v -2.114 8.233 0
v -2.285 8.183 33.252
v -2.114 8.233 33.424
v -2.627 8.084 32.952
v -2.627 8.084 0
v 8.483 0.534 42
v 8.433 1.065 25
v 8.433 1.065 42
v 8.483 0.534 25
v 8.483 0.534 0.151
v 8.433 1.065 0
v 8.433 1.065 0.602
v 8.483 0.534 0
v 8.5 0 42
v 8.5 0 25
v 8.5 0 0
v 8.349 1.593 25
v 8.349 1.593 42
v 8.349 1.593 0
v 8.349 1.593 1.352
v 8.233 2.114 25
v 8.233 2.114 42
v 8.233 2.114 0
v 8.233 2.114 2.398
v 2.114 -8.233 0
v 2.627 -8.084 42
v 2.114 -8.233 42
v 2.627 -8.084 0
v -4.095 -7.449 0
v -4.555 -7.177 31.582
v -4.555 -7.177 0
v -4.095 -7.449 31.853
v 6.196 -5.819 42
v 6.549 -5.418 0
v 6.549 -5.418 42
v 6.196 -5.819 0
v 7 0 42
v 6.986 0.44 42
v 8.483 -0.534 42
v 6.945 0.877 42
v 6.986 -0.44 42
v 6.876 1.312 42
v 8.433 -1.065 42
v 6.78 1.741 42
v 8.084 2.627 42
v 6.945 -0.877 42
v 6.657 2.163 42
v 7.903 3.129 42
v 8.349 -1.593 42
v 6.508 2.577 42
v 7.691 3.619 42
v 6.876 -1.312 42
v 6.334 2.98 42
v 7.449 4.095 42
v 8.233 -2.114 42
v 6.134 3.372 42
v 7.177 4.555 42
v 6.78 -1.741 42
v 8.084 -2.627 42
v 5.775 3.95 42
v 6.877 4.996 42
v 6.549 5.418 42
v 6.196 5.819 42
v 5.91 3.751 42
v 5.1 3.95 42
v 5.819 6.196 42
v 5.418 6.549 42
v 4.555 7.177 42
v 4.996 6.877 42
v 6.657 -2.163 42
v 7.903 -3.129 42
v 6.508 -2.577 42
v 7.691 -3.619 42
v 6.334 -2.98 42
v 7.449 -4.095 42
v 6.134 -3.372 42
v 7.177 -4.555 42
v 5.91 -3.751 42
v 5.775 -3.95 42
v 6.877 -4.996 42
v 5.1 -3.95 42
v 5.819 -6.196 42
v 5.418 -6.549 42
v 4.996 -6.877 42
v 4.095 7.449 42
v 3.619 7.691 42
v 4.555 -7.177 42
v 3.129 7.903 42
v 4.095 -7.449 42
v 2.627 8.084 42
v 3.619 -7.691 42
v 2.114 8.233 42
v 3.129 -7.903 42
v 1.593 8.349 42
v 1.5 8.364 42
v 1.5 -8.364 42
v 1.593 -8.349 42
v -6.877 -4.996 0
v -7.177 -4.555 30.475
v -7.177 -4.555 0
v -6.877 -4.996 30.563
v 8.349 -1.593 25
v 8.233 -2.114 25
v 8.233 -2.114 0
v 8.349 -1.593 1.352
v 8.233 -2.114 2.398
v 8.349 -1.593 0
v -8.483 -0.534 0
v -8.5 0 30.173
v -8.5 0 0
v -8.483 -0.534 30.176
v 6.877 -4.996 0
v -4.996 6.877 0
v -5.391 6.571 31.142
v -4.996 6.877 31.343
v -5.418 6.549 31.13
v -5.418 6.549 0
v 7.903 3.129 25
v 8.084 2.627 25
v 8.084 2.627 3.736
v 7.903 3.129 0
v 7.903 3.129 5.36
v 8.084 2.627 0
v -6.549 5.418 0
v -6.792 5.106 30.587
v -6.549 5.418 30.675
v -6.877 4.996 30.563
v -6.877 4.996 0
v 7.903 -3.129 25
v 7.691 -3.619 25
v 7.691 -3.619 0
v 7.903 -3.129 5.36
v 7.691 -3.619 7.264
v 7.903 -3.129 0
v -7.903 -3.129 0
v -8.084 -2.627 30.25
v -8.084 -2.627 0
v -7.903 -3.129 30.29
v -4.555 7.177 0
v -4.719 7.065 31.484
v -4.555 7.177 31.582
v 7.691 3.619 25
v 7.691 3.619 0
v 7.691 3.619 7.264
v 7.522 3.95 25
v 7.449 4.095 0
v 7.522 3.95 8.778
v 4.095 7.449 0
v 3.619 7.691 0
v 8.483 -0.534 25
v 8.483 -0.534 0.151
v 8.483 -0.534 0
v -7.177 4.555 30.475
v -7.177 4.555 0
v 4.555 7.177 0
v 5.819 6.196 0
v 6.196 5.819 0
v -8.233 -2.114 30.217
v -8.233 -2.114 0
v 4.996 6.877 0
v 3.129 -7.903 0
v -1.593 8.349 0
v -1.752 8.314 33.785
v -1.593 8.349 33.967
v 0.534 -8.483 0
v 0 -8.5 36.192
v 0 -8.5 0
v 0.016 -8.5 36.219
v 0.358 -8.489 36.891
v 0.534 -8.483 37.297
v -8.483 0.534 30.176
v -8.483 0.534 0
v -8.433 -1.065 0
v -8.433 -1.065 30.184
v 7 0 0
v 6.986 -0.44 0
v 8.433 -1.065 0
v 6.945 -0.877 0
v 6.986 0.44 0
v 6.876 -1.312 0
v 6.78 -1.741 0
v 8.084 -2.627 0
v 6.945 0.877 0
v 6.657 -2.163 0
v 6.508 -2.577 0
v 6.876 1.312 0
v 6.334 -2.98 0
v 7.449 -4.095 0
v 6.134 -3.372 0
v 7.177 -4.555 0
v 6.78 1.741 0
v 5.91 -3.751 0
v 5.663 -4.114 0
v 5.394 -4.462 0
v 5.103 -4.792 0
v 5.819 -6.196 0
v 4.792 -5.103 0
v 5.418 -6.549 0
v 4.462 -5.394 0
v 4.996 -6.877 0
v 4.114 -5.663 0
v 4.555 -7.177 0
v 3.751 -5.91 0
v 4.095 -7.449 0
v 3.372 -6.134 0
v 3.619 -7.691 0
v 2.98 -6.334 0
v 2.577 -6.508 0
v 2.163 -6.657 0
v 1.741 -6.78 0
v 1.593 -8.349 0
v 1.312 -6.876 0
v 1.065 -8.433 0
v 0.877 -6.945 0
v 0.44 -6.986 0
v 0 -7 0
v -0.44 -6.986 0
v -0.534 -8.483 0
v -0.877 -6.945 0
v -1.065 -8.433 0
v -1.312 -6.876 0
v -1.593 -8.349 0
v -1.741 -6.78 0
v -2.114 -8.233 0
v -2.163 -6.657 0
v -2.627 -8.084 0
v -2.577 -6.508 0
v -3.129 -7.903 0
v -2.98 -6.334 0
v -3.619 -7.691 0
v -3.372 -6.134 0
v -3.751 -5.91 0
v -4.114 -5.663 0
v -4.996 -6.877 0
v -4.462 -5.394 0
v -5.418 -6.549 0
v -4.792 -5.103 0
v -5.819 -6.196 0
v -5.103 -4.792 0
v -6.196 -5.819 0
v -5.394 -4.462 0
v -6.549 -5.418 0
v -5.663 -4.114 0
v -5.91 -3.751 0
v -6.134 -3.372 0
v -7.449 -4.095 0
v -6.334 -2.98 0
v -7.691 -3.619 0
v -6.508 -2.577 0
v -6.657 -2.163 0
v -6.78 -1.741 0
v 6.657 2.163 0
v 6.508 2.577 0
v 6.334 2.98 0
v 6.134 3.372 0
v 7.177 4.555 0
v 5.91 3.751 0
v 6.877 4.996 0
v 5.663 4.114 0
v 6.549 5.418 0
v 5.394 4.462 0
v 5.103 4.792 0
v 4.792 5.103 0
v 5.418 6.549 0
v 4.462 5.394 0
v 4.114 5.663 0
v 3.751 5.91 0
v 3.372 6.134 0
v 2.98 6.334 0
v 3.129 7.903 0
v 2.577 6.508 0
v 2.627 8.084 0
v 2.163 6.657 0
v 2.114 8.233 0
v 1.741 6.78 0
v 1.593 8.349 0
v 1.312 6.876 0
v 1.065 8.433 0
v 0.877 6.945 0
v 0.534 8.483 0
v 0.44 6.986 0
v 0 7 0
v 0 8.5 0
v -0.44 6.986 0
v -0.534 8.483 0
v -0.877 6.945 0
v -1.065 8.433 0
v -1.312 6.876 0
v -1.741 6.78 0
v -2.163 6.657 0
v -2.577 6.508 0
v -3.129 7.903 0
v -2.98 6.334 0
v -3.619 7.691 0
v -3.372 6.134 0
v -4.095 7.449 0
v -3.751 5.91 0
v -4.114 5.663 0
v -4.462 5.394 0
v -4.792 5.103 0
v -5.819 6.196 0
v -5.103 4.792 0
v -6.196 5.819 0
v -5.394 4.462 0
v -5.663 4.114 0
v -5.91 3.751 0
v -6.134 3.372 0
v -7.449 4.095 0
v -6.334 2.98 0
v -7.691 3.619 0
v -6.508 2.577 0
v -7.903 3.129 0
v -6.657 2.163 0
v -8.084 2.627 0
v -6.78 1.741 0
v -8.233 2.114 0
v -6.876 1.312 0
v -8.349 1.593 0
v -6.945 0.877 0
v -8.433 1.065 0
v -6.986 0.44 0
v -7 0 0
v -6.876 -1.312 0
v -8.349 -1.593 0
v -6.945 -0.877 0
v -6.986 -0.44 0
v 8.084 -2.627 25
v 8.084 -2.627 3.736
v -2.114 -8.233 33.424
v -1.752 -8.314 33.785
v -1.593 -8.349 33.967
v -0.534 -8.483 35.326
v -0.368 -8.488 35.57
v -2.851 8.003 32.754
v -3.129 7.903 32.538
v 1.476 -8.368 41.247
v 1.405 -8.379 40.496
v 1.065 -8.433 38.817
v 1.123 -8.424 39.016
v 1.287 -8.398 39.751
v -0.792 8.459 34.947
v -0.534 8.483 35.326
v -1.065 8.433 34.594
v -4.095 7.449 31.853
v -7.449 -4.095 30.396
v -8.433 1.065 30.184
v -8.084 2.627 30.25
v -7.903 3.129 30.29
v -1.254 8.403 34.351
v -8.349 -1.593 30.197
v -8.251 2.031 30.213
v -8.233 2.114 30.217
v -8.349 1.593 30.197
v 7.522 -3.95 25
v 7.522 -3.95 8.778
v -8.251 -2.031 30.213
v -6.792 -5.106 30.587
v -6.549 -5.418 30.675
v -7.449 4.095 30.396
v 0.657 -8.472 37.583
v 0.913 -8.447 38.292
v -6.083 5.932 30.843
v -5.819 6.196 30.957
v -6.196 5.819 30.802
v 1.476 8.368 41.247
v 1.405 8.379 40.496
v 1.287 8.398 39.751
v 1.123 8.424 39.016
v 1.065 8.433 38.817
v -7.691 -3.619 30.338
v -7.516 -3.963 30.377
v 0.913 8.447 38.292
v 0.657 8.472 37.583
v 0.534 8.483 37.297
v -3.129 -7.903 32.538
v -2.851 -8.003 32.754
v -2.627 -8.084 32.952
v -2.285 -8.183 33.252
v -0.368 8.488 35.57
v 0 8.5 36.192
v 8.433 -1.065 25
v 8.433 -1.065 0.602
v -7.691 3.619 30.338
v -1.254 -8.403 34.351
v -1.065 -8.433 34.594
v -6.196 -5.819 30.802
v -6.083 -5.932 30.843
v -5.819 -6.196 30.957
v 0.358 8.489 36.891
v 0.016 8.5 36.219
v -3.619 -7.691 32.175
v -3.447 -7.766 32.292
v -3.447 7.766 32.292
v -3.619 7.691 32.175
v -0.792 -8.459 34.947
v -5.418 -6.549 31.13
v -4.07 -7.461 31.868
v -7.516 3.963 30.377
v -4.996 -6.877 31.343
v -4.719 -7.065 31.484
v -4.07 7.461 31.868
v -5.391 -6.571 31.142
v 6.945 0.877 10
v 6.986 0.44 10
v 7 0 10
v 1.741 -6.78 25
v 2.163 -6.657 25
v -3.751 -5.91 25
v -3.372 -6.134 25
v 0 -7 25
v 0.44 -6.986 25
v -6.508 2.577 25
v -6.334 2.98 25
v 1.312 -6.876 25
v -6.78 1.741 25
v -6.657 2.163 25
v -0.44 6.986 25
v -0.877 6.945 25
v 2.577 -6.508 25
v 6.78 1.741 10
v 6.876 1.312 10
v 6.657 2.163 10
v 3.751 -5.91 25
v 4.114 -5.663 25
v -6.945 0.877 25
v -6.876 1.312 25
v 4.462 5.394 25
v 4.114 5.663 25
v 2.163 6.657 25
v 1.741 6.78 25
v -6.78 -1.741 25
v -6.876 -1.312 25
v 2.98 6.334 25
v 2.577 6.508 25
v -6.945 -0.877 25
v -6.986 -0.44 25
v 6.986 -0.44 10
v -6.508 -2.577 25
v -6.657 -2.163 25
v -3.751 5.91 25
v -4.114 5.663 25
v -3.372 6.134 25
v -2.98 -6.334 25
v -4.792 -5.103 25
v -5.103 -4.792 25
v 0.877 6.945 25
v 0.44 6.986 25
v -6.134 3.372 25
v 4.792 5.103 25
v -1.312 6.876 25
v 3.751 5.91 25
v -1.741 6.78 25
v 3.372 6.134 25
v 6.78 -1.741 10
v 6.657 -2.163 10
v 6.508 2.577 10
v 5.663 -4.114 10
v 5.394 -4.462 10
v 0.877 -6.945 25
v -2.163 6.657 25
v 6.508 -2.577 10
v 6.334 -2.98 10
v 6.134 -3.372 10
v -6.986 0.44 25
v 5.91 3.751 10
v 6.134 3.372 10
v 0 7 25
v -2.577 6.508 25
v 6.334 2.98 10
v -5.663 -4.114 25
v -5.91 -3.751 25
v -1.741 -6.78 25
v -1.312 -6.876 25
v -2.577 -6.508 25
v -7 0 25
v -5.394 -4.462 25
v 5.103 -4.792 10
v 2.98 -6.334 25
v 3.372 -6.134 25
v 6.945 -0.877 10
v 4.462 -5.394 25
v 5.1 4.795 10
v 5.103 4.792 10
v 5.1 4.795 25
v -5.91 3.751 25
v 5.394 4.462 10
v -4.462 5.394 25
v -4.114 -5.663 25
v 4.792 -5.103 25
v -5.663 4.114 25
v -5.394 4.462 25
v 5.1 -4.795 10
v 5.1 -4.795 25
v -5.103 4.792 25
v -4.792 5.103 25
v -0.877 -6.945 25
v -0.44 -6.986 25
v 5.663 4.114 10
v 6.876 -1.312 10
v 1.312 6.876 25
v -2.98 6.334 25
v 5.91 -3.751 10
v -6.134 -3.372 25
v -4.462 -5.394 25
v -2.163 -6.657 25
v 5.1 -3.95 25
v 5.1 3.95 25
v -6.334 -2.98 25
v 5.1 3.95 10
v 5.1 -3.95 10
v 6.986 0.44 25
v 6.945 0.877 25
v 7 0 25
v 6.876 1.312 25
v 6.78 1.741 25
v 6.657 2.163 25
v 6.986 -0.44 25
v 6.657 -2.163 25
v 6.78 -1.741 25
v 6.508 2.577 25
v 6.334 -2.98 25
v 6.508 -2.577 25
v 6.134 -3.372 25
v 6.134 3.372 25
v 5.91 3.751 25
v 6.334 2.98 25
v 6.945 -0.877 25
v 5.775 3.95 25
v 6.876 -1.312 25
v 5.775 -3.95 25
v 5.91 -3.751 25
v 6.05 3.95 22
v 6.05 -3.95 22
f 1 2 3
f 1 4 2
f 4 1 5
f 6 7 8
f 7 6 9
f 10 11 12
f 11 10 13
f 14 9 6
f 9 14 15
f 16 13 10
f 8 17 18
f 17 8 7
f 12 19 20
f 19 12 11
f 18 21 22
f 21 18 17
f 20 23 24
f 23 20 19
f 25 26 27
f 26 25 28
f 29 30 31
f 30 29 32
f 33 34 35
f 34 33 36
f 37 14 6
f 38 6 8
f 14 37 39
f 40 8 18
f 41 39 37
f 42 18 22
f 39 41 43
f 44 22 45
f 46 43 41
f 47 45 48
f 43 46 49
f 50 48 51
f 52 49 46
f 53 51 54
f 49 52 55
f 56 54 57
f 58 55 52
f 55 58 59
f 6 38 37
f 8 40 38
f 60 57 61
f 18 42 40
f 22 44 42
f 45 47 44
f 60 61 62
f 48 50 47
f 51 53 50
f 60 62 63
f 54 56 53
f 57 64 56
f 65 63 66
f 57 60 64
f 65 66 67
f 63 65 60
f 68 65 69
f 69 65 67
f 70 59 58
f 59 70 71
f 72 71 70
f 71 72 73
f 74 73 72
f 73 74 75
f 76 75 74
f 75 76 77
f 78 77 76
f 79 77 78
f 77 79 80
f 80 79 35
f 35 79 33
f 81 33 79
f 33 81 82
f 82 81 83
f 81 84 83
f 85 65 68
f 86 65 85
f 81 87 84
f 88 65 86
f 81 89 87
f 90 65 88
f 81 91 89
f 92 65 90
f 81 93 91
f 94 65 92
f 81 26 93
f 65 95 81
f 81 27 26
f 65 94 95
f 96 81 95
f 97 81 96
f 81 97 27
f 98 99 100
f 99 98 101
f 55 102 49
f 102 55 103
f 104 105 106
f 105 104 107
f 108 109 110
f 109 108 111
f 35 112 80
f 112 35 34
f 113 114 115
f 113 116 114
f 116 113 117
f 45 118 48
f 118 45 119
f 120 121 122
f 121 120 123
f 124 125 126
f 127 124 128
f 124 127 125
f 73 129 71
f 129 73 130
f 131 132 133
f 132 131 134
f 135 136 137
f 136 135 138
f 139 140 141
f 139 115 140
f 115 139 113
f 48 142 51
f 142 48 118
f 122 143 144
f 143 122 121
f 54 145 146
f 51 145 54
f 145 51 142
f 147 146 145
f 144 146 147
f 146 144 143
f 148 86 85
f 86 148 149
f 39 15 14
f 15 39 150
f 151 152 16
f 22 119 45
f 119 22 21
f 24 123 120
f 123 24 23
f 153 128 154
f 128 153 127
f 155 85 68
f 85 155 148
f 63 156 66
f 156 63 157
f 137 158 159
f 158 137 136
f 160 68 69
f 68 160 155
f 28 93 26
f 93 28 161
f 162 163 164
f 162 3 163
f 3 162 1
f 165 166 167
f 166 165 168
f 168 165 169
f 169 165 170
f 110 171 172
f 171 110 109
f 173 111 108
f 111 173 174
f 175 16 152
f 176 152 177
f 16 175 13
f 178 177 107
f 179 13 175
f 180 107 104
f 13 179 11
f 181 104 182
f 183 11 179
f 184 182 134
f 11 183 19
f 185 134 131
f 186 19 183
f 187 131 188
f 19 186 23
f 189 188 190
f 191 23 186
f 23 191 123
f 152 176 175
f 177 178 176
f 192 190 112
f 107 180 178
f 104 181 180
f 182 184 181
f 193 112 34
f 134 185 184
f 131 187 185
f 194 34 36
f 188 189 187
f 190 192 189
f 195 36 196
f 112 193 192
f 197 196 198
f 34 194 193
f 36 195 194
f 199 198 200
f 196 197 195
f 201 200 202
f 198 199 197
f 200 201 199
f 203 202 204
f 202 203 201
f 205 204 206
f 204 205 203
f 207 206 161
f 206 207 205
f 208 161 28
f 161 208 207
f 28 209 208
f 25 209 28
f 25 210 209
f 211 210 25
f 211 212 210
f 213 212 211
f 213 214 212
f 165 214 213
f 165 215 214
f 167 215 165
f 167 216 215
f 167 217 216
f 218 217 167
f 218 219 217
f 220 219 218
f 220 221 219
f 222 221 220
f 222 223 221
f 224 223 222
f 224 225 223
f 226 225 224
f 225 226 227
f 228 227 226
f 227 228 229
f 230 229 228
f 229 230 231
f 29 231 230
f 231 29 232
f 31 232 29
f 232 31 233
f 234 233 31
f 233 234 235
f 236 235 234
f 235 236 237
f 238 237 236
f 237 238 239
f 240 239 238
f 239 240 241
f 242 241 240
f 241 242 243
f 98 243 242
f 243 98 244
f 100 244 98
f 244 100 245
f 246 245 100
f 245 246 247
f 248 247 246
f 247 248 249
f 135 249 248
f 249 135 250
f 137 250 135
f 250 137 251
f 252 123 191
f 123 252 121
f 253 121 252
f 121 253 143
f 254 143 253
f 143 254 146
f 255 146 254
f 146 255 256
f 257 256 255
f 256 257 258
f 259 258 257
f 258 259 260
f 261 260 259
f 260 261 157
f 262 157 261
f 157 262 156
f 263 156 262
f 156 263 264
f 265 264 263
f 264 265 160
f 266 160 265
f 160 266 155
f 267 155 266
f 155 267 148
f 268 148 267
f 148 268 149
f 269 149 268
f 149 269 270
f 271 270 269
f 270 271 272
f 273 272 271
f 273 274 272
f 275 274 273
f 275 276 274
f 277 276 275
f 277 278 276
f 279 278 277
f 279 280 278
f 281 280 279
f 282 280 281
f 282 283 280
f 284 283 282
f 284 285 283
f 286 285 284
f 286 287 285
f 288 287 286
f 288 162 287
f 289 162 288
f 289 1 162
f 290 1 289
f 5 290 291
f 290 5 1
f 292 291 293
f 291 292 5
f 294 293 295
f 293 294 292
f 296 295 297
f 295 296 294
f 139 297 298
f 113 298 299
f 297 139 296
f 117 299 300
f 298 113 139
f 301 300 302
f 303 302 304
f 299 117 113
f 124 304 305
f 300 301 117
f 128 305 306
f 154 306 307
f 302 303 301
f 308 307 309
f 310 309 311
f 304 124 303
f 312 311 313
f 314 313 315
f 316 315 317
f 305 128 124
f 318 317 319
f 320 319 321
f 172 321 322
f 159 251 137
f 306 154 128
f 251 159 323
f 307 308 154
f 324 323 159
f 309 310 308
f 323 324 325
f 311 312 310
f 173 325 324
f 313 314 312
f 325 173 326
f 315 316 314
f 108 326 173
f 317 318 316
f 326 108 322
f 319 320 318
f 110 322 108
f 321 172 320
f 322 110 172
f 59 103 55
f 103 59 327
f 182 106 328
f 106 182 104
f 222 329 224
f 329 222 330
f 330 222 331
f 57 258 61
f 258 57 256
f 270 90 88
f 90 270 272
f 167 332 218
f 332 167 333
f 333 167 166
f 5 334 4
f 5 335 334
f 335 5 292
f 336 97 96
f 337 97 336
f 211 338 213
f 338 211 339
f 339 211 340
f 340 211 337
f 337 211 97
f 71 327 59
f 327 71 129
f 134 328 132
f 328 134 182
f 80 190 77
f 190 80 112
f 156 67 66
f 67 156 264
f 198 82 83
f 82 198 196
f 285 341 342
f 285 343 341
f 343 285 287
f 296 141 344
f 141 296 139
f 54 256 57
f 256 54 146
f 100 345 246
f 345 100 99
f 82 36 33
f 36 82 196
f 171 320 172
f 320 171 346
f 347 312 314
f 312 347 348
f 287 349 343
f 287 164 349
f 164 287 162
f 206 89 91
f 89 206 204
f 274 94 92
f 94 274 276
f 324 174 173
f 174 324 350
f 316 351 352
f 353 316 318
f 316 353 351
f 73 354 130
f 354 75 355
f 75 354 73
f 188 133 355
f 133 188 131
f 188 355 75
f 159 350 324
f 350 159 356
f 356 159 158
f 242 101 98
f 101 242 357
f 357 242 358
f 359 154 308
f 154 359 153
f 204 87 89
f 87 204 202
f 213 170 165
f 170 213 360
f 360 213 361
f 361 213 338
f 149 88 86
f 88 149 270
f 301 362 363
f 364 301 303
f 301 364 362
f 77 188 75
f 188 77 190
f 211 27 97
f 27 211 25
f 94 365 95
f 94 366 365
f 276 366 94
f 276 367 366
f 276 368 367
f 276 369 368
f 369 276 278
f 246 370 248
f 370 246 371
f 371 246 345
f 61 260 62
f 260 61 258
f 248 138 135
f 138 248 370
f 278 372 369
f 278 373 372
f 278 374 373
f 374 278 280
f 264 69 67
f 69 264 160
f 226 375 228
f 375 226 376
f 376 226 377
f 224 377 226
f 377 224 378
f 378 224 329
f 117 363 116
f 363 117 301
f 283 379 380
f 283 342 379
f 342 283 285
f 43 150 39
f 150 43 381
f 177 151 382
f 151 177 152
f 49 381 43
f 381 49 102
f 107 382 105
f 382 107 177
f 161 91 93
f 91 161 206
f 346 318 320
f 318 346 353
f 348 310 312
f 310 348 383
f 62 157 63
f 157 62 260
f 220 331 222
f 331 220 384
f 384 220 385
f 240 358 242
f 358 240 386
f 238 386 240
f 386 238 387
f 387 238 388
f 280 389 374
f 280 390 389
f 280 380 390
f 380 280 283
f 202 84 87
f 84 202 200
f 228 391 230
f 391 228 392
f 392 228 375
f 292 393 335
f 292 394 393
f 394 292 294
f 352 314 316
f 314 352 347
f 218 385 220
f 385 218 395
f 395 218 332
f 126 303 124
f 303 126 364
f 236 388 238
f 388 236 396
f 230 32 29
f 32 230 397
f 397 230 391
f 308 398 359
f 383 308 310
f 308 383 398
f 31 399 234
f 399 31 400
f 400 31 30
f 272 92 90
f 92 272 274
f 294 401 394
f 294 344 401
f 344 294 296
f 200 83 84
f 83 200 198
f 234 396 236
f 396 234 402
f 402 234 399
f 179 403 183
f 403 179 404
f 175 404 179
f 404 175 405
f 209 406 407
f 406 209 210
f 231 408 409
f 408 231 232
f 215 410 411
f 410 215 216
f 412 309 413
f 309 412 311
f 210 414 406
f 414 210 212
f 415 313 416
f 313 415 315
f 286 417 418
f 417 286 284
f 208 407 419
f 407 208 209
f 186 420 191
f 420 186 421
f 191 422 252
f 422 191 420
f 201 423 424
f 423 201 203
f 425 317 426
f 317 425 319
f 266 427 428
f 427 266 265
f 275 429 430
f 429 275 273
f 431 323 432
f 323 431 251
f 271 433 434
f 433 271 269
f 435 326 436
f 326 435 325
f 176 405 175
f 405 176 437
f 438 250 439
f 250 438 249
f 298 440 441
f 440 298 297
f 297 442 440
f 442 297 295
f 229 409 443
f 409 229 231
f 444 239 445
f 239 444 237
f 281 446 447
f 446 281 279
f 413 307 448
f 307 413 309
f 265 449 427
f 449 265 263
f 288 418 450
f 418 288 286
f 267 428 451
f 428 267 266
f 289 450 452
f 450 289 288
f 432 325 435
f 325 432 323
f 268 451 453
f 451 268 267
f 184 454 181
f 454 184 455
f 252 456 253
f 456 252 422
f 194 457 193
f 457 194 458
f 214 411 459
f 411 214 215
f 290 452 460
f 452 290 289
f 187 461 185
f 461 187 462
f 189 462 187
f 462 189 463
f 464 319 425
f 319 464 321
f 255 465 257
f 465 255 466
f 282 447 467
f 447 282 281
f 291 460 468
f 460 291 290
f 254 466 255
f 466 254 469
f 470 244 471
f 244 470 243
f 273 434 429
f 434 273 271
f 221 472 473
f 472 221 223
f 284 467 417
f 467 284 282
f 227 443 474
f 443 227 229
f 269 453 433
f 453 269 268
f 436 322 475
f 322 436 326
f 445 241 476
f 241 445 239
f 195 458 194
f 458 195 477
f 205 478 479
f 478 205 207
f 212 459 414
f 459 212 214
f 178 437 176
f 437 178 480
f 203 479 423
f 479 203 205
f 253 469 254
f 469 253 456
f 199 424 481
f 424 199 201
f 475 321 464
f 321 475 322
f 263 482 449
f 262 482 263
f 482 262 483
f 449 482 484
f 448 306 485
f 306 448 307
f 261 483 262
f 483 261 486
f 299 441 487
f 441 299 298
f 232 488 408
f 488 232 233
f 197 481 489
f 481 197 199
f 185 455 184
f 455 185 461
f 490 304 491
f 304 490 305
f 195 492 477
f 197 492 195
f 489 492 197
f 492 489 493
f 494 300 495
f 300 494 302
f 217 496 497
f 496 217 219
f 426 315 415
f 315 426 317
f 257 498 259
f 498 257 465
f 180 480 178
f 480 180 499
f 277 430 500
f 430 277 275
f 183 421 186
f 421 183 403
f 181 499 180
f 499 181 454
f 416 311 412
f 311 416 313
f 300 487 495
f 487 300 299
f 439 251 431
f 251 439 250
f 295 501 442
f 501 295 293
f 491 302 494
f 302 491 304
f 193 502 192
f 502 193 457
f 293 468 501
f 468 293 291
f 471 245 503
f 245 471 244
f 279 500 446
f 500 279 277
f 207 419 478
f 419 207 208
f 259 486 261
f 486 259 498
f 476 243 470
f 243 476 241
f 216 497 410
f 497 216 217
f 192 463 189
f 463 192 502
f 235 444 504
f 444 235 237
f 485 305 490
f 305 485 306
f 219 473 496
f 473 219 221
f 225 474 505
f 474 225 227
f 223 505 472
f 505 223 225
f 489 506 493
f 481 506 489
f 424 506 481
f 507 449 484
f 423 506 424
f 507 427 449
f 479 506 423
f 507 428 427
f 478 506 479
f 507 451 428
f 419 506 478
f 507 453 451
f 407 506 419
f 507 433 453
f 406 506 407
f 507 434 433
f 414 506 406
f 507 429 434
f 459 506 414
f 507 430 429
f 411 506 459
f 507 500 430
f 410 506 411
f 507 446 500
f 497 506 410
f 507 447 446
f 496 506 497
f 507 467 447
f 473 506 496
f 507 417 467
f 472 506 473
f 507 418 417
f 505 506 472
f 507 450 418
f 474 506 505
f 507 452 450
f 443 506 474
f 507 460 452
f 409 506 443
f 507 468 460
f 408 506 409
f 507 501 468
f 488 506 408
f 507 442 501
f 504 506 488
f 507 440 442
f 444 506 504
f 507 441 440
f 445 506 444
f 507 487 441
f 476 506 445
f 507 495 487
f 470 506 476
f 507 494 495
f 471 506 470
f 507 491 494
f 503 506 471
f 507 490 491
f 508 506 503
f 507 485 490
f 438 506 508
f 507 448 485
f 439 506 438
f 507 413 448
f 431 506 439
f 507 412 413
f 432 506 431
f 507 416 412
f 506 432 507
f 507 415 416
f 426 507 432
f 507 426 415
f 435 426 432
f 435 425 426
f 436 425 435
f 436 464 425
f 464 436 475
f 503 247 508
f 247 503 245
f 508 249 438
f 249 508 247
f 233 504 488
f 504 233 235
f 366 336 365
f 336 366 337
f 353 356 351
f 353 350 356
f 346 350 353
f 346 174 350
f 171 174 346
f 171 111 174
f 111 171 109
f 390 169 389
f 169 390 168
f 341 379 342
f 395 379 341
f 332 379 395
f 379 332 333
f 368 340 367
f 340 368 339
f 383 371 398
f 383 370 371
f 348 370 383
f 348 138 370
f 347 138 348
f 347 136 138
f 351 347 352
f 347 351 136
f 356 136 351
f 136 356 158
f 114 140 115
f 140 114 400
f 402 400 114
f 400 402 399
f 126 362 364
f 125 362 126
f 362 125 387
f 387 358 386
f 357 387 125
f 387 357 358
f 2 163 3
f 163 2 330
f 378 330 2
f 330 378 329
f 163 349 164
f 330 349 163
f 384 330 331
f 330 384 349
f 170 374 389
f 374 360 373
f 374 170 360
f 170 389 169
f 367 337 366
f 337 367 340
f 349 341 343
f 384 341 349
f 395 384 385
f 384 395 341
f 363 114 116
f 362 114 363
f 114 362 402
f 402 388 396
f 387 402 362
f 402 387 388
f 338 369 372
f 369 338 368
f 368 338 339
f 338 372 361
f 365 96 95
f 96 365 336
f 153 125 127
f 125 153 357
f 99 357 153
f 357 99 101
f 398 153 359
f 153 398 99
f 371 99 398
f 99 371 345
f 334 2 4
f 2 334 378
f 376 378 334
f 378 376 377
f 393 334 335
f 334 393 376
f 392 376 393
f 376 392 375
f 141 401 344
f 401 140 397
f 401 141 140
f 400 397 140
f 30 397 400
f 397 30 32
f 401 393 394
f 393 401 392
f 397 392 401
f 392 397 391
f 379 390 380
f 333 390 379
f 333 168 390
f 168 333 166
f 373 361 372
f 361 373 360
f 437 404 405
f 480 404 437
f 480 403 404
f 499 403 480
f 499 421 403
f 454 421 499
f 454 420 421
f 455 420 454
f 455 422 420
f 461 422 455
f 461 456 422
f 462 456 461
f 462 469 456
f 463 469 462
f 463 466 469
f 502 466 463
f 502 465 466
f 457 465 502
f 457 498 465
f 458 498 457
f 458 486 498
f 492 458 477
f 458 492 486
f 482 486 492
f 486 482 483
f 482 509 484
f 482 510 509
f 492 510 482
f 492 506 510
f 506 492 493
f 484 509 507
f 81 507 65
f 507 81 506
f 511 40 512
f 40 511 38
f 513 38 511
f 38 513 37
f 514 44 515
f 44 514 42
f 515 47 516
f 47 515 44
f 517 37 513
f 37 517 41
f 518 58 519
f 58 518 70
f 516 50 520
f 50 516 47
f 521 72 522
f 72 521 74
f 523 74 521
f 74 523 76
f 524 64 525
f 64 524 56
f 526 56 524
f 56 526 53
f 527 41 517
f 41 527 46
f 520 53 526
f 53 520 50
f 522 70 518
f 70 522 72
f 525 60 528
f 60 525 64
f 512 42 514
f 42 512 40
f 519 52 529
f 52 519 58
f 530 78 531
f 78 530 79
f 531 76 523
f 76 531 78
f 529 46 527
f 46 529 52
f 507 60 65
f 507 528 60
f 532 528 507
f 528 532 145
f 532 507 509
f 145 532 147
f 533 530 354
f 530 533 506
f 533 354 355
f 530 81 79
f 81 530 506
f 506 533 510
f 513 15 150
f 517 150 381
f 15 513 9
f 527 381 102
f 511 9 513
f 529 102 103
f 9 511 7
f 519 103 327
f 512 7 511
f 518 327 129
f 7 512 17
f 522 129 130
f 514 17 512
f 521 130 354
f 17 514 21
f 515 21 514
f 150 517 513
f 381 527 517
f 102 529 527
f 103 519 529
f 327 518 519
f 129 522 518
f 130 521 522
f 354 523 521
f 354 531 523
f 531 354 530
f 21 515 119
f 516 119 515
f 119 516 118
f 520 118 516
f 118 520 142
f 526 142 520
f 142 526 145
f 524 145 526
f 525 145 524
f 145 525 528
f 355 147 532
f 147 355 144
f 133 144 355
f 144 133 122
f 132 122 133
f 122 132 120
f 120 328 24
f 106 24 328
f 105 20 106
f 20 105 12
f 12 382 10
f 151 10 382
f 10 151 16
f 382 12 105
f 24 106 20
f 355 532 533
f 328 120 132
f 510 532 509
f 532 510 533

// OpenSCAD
$fn=100*1;              // Smooth cylinders
// Outer radius of fipple
OuterRadius = 8.5;      
// Inner radius of fipple
InnerRadius = 7;        
// Overall height of mouthpiece
TotalHeight = 42;       
// Height to bottom of blowhole
BodyHeight = 25;        
// Radius of cutout for lower lip relief
LipRadius = 12;         
// Depth of air hole
AirDepth = 1.9;         
// Width of air hole
AirWidth = 7.9;         
// Height of sound hole
SoundHoleHeight = 15;   
// Height of blade in sound hole
BladeHeight = 12;       
// Depth of blade as a fraction of AirDepth
BladeDepth = .5;        


// The outer edge of the pipe
module OuterCylinder() {
    translate(0, 0, TotalHeight / 2)
        cylinder(r = OuterRadius, h = TotalHeight);
}

// Overall Shell of Mouthpiece
module MouthpieceShell()
{
    difference() {
        // Outer cylinder
        OuterCylinder();
        // Inner cylinder: only goes partway up
		cylinder(r = InnerRadius, h = BodyHeight);
		// cutout for lower lip
		rotate(90, [1,0,0])
            translate([-1 * TotalHeight / 4, TotalHeight, -1 * OuterRadius])
            cylinder(r = LipRadius, OuterRadius * 2);
    }
}

module AirwayCube(width = AirWidth, height = TotalHeight, extra=true)
{
    offset = 0;
    if (extra == true) { offset = 0.5; }

    translate([InnerRadius - AirDepth, -1*width/2, TotalHeight - height - offset])
        cube([OuterRadius,width,height + 2*offset]);
}

// The part you blow through
module BlowHole()
{
    intersection() {
        cylinder(r = InnerRadius, h = TotalHeight);
        AirwayCube(width = AirWidth, height = TotalHeight - BodyHeight + SoundHoleHeight - BladeHeight);
    }
}

module BladeInsert()
{
    intersection() {
        OuterCylinder();
        AirwayCube(width=OuterRadius*2, height=TotalHeight-BodyHeight + SoundHoleHeight, extra = false);
    }
}

// Kind of an ugly hack for making ramps.
module Ramp(inside = false, CheckSlope = true)
{
    X = InnerRadius - AirDepth*BladeDepth;
    Y = AirWidth/2;
    Z = BodyHeight - (SoundHoleHeight - BladeHeight);
    slope = -BladeHeight / (AirDepth * BladeDepth);
    
    if (inside == true)
    {
        translate([X,0,Z])
            rotate(180, [0,0,1])
            translate([-X,0,-Z])
            RampCube(X=X,Y=Y,Z=Z,slope=slope);
    }
    else
    {
        // Double-check the slope
        slope = max( slope, -Z/((AirDepth * BladeDepth) + (OuterRadius-InnerRadius)));
        RampCube(X=X,Y=Y,Z=Z,slope=slope);
    }
}

module RampCube(X,Y,Z,slope)
{
    polyhedron(
        points = [[X,Y,Z],[X,-Y,Z],[X-Z/slope,Y,0],[X-Z/slope,-Y,0],[X+OuterRadius,Y,Z],[X+OuterRadius,-Y,Z],[X-Z/slope+OuterRadius,Y,0],[X-Z/slope+OuterRadius,-Y,0]],
        faces = [[0,1,3,2],[0,2,6,4],[1,5,7,3],[5,4,6,7],[1,0,4,5],[2,3,7,6]]);
}

module BladeHoleTop()
{
    
    union() {
        translate([0,0, - (TotalHeight-BodyHeight)])
            AirwayCube(height = SoundHoleHeight - BladeHeight, extra = false);
        Ramp();
        Ramp(inside = true);
    }
}

difference() {
    union() {
        MouthpieceShell();
        BladeInsert();
    }
    BlowHole();
    BladeHoleTop();
}
